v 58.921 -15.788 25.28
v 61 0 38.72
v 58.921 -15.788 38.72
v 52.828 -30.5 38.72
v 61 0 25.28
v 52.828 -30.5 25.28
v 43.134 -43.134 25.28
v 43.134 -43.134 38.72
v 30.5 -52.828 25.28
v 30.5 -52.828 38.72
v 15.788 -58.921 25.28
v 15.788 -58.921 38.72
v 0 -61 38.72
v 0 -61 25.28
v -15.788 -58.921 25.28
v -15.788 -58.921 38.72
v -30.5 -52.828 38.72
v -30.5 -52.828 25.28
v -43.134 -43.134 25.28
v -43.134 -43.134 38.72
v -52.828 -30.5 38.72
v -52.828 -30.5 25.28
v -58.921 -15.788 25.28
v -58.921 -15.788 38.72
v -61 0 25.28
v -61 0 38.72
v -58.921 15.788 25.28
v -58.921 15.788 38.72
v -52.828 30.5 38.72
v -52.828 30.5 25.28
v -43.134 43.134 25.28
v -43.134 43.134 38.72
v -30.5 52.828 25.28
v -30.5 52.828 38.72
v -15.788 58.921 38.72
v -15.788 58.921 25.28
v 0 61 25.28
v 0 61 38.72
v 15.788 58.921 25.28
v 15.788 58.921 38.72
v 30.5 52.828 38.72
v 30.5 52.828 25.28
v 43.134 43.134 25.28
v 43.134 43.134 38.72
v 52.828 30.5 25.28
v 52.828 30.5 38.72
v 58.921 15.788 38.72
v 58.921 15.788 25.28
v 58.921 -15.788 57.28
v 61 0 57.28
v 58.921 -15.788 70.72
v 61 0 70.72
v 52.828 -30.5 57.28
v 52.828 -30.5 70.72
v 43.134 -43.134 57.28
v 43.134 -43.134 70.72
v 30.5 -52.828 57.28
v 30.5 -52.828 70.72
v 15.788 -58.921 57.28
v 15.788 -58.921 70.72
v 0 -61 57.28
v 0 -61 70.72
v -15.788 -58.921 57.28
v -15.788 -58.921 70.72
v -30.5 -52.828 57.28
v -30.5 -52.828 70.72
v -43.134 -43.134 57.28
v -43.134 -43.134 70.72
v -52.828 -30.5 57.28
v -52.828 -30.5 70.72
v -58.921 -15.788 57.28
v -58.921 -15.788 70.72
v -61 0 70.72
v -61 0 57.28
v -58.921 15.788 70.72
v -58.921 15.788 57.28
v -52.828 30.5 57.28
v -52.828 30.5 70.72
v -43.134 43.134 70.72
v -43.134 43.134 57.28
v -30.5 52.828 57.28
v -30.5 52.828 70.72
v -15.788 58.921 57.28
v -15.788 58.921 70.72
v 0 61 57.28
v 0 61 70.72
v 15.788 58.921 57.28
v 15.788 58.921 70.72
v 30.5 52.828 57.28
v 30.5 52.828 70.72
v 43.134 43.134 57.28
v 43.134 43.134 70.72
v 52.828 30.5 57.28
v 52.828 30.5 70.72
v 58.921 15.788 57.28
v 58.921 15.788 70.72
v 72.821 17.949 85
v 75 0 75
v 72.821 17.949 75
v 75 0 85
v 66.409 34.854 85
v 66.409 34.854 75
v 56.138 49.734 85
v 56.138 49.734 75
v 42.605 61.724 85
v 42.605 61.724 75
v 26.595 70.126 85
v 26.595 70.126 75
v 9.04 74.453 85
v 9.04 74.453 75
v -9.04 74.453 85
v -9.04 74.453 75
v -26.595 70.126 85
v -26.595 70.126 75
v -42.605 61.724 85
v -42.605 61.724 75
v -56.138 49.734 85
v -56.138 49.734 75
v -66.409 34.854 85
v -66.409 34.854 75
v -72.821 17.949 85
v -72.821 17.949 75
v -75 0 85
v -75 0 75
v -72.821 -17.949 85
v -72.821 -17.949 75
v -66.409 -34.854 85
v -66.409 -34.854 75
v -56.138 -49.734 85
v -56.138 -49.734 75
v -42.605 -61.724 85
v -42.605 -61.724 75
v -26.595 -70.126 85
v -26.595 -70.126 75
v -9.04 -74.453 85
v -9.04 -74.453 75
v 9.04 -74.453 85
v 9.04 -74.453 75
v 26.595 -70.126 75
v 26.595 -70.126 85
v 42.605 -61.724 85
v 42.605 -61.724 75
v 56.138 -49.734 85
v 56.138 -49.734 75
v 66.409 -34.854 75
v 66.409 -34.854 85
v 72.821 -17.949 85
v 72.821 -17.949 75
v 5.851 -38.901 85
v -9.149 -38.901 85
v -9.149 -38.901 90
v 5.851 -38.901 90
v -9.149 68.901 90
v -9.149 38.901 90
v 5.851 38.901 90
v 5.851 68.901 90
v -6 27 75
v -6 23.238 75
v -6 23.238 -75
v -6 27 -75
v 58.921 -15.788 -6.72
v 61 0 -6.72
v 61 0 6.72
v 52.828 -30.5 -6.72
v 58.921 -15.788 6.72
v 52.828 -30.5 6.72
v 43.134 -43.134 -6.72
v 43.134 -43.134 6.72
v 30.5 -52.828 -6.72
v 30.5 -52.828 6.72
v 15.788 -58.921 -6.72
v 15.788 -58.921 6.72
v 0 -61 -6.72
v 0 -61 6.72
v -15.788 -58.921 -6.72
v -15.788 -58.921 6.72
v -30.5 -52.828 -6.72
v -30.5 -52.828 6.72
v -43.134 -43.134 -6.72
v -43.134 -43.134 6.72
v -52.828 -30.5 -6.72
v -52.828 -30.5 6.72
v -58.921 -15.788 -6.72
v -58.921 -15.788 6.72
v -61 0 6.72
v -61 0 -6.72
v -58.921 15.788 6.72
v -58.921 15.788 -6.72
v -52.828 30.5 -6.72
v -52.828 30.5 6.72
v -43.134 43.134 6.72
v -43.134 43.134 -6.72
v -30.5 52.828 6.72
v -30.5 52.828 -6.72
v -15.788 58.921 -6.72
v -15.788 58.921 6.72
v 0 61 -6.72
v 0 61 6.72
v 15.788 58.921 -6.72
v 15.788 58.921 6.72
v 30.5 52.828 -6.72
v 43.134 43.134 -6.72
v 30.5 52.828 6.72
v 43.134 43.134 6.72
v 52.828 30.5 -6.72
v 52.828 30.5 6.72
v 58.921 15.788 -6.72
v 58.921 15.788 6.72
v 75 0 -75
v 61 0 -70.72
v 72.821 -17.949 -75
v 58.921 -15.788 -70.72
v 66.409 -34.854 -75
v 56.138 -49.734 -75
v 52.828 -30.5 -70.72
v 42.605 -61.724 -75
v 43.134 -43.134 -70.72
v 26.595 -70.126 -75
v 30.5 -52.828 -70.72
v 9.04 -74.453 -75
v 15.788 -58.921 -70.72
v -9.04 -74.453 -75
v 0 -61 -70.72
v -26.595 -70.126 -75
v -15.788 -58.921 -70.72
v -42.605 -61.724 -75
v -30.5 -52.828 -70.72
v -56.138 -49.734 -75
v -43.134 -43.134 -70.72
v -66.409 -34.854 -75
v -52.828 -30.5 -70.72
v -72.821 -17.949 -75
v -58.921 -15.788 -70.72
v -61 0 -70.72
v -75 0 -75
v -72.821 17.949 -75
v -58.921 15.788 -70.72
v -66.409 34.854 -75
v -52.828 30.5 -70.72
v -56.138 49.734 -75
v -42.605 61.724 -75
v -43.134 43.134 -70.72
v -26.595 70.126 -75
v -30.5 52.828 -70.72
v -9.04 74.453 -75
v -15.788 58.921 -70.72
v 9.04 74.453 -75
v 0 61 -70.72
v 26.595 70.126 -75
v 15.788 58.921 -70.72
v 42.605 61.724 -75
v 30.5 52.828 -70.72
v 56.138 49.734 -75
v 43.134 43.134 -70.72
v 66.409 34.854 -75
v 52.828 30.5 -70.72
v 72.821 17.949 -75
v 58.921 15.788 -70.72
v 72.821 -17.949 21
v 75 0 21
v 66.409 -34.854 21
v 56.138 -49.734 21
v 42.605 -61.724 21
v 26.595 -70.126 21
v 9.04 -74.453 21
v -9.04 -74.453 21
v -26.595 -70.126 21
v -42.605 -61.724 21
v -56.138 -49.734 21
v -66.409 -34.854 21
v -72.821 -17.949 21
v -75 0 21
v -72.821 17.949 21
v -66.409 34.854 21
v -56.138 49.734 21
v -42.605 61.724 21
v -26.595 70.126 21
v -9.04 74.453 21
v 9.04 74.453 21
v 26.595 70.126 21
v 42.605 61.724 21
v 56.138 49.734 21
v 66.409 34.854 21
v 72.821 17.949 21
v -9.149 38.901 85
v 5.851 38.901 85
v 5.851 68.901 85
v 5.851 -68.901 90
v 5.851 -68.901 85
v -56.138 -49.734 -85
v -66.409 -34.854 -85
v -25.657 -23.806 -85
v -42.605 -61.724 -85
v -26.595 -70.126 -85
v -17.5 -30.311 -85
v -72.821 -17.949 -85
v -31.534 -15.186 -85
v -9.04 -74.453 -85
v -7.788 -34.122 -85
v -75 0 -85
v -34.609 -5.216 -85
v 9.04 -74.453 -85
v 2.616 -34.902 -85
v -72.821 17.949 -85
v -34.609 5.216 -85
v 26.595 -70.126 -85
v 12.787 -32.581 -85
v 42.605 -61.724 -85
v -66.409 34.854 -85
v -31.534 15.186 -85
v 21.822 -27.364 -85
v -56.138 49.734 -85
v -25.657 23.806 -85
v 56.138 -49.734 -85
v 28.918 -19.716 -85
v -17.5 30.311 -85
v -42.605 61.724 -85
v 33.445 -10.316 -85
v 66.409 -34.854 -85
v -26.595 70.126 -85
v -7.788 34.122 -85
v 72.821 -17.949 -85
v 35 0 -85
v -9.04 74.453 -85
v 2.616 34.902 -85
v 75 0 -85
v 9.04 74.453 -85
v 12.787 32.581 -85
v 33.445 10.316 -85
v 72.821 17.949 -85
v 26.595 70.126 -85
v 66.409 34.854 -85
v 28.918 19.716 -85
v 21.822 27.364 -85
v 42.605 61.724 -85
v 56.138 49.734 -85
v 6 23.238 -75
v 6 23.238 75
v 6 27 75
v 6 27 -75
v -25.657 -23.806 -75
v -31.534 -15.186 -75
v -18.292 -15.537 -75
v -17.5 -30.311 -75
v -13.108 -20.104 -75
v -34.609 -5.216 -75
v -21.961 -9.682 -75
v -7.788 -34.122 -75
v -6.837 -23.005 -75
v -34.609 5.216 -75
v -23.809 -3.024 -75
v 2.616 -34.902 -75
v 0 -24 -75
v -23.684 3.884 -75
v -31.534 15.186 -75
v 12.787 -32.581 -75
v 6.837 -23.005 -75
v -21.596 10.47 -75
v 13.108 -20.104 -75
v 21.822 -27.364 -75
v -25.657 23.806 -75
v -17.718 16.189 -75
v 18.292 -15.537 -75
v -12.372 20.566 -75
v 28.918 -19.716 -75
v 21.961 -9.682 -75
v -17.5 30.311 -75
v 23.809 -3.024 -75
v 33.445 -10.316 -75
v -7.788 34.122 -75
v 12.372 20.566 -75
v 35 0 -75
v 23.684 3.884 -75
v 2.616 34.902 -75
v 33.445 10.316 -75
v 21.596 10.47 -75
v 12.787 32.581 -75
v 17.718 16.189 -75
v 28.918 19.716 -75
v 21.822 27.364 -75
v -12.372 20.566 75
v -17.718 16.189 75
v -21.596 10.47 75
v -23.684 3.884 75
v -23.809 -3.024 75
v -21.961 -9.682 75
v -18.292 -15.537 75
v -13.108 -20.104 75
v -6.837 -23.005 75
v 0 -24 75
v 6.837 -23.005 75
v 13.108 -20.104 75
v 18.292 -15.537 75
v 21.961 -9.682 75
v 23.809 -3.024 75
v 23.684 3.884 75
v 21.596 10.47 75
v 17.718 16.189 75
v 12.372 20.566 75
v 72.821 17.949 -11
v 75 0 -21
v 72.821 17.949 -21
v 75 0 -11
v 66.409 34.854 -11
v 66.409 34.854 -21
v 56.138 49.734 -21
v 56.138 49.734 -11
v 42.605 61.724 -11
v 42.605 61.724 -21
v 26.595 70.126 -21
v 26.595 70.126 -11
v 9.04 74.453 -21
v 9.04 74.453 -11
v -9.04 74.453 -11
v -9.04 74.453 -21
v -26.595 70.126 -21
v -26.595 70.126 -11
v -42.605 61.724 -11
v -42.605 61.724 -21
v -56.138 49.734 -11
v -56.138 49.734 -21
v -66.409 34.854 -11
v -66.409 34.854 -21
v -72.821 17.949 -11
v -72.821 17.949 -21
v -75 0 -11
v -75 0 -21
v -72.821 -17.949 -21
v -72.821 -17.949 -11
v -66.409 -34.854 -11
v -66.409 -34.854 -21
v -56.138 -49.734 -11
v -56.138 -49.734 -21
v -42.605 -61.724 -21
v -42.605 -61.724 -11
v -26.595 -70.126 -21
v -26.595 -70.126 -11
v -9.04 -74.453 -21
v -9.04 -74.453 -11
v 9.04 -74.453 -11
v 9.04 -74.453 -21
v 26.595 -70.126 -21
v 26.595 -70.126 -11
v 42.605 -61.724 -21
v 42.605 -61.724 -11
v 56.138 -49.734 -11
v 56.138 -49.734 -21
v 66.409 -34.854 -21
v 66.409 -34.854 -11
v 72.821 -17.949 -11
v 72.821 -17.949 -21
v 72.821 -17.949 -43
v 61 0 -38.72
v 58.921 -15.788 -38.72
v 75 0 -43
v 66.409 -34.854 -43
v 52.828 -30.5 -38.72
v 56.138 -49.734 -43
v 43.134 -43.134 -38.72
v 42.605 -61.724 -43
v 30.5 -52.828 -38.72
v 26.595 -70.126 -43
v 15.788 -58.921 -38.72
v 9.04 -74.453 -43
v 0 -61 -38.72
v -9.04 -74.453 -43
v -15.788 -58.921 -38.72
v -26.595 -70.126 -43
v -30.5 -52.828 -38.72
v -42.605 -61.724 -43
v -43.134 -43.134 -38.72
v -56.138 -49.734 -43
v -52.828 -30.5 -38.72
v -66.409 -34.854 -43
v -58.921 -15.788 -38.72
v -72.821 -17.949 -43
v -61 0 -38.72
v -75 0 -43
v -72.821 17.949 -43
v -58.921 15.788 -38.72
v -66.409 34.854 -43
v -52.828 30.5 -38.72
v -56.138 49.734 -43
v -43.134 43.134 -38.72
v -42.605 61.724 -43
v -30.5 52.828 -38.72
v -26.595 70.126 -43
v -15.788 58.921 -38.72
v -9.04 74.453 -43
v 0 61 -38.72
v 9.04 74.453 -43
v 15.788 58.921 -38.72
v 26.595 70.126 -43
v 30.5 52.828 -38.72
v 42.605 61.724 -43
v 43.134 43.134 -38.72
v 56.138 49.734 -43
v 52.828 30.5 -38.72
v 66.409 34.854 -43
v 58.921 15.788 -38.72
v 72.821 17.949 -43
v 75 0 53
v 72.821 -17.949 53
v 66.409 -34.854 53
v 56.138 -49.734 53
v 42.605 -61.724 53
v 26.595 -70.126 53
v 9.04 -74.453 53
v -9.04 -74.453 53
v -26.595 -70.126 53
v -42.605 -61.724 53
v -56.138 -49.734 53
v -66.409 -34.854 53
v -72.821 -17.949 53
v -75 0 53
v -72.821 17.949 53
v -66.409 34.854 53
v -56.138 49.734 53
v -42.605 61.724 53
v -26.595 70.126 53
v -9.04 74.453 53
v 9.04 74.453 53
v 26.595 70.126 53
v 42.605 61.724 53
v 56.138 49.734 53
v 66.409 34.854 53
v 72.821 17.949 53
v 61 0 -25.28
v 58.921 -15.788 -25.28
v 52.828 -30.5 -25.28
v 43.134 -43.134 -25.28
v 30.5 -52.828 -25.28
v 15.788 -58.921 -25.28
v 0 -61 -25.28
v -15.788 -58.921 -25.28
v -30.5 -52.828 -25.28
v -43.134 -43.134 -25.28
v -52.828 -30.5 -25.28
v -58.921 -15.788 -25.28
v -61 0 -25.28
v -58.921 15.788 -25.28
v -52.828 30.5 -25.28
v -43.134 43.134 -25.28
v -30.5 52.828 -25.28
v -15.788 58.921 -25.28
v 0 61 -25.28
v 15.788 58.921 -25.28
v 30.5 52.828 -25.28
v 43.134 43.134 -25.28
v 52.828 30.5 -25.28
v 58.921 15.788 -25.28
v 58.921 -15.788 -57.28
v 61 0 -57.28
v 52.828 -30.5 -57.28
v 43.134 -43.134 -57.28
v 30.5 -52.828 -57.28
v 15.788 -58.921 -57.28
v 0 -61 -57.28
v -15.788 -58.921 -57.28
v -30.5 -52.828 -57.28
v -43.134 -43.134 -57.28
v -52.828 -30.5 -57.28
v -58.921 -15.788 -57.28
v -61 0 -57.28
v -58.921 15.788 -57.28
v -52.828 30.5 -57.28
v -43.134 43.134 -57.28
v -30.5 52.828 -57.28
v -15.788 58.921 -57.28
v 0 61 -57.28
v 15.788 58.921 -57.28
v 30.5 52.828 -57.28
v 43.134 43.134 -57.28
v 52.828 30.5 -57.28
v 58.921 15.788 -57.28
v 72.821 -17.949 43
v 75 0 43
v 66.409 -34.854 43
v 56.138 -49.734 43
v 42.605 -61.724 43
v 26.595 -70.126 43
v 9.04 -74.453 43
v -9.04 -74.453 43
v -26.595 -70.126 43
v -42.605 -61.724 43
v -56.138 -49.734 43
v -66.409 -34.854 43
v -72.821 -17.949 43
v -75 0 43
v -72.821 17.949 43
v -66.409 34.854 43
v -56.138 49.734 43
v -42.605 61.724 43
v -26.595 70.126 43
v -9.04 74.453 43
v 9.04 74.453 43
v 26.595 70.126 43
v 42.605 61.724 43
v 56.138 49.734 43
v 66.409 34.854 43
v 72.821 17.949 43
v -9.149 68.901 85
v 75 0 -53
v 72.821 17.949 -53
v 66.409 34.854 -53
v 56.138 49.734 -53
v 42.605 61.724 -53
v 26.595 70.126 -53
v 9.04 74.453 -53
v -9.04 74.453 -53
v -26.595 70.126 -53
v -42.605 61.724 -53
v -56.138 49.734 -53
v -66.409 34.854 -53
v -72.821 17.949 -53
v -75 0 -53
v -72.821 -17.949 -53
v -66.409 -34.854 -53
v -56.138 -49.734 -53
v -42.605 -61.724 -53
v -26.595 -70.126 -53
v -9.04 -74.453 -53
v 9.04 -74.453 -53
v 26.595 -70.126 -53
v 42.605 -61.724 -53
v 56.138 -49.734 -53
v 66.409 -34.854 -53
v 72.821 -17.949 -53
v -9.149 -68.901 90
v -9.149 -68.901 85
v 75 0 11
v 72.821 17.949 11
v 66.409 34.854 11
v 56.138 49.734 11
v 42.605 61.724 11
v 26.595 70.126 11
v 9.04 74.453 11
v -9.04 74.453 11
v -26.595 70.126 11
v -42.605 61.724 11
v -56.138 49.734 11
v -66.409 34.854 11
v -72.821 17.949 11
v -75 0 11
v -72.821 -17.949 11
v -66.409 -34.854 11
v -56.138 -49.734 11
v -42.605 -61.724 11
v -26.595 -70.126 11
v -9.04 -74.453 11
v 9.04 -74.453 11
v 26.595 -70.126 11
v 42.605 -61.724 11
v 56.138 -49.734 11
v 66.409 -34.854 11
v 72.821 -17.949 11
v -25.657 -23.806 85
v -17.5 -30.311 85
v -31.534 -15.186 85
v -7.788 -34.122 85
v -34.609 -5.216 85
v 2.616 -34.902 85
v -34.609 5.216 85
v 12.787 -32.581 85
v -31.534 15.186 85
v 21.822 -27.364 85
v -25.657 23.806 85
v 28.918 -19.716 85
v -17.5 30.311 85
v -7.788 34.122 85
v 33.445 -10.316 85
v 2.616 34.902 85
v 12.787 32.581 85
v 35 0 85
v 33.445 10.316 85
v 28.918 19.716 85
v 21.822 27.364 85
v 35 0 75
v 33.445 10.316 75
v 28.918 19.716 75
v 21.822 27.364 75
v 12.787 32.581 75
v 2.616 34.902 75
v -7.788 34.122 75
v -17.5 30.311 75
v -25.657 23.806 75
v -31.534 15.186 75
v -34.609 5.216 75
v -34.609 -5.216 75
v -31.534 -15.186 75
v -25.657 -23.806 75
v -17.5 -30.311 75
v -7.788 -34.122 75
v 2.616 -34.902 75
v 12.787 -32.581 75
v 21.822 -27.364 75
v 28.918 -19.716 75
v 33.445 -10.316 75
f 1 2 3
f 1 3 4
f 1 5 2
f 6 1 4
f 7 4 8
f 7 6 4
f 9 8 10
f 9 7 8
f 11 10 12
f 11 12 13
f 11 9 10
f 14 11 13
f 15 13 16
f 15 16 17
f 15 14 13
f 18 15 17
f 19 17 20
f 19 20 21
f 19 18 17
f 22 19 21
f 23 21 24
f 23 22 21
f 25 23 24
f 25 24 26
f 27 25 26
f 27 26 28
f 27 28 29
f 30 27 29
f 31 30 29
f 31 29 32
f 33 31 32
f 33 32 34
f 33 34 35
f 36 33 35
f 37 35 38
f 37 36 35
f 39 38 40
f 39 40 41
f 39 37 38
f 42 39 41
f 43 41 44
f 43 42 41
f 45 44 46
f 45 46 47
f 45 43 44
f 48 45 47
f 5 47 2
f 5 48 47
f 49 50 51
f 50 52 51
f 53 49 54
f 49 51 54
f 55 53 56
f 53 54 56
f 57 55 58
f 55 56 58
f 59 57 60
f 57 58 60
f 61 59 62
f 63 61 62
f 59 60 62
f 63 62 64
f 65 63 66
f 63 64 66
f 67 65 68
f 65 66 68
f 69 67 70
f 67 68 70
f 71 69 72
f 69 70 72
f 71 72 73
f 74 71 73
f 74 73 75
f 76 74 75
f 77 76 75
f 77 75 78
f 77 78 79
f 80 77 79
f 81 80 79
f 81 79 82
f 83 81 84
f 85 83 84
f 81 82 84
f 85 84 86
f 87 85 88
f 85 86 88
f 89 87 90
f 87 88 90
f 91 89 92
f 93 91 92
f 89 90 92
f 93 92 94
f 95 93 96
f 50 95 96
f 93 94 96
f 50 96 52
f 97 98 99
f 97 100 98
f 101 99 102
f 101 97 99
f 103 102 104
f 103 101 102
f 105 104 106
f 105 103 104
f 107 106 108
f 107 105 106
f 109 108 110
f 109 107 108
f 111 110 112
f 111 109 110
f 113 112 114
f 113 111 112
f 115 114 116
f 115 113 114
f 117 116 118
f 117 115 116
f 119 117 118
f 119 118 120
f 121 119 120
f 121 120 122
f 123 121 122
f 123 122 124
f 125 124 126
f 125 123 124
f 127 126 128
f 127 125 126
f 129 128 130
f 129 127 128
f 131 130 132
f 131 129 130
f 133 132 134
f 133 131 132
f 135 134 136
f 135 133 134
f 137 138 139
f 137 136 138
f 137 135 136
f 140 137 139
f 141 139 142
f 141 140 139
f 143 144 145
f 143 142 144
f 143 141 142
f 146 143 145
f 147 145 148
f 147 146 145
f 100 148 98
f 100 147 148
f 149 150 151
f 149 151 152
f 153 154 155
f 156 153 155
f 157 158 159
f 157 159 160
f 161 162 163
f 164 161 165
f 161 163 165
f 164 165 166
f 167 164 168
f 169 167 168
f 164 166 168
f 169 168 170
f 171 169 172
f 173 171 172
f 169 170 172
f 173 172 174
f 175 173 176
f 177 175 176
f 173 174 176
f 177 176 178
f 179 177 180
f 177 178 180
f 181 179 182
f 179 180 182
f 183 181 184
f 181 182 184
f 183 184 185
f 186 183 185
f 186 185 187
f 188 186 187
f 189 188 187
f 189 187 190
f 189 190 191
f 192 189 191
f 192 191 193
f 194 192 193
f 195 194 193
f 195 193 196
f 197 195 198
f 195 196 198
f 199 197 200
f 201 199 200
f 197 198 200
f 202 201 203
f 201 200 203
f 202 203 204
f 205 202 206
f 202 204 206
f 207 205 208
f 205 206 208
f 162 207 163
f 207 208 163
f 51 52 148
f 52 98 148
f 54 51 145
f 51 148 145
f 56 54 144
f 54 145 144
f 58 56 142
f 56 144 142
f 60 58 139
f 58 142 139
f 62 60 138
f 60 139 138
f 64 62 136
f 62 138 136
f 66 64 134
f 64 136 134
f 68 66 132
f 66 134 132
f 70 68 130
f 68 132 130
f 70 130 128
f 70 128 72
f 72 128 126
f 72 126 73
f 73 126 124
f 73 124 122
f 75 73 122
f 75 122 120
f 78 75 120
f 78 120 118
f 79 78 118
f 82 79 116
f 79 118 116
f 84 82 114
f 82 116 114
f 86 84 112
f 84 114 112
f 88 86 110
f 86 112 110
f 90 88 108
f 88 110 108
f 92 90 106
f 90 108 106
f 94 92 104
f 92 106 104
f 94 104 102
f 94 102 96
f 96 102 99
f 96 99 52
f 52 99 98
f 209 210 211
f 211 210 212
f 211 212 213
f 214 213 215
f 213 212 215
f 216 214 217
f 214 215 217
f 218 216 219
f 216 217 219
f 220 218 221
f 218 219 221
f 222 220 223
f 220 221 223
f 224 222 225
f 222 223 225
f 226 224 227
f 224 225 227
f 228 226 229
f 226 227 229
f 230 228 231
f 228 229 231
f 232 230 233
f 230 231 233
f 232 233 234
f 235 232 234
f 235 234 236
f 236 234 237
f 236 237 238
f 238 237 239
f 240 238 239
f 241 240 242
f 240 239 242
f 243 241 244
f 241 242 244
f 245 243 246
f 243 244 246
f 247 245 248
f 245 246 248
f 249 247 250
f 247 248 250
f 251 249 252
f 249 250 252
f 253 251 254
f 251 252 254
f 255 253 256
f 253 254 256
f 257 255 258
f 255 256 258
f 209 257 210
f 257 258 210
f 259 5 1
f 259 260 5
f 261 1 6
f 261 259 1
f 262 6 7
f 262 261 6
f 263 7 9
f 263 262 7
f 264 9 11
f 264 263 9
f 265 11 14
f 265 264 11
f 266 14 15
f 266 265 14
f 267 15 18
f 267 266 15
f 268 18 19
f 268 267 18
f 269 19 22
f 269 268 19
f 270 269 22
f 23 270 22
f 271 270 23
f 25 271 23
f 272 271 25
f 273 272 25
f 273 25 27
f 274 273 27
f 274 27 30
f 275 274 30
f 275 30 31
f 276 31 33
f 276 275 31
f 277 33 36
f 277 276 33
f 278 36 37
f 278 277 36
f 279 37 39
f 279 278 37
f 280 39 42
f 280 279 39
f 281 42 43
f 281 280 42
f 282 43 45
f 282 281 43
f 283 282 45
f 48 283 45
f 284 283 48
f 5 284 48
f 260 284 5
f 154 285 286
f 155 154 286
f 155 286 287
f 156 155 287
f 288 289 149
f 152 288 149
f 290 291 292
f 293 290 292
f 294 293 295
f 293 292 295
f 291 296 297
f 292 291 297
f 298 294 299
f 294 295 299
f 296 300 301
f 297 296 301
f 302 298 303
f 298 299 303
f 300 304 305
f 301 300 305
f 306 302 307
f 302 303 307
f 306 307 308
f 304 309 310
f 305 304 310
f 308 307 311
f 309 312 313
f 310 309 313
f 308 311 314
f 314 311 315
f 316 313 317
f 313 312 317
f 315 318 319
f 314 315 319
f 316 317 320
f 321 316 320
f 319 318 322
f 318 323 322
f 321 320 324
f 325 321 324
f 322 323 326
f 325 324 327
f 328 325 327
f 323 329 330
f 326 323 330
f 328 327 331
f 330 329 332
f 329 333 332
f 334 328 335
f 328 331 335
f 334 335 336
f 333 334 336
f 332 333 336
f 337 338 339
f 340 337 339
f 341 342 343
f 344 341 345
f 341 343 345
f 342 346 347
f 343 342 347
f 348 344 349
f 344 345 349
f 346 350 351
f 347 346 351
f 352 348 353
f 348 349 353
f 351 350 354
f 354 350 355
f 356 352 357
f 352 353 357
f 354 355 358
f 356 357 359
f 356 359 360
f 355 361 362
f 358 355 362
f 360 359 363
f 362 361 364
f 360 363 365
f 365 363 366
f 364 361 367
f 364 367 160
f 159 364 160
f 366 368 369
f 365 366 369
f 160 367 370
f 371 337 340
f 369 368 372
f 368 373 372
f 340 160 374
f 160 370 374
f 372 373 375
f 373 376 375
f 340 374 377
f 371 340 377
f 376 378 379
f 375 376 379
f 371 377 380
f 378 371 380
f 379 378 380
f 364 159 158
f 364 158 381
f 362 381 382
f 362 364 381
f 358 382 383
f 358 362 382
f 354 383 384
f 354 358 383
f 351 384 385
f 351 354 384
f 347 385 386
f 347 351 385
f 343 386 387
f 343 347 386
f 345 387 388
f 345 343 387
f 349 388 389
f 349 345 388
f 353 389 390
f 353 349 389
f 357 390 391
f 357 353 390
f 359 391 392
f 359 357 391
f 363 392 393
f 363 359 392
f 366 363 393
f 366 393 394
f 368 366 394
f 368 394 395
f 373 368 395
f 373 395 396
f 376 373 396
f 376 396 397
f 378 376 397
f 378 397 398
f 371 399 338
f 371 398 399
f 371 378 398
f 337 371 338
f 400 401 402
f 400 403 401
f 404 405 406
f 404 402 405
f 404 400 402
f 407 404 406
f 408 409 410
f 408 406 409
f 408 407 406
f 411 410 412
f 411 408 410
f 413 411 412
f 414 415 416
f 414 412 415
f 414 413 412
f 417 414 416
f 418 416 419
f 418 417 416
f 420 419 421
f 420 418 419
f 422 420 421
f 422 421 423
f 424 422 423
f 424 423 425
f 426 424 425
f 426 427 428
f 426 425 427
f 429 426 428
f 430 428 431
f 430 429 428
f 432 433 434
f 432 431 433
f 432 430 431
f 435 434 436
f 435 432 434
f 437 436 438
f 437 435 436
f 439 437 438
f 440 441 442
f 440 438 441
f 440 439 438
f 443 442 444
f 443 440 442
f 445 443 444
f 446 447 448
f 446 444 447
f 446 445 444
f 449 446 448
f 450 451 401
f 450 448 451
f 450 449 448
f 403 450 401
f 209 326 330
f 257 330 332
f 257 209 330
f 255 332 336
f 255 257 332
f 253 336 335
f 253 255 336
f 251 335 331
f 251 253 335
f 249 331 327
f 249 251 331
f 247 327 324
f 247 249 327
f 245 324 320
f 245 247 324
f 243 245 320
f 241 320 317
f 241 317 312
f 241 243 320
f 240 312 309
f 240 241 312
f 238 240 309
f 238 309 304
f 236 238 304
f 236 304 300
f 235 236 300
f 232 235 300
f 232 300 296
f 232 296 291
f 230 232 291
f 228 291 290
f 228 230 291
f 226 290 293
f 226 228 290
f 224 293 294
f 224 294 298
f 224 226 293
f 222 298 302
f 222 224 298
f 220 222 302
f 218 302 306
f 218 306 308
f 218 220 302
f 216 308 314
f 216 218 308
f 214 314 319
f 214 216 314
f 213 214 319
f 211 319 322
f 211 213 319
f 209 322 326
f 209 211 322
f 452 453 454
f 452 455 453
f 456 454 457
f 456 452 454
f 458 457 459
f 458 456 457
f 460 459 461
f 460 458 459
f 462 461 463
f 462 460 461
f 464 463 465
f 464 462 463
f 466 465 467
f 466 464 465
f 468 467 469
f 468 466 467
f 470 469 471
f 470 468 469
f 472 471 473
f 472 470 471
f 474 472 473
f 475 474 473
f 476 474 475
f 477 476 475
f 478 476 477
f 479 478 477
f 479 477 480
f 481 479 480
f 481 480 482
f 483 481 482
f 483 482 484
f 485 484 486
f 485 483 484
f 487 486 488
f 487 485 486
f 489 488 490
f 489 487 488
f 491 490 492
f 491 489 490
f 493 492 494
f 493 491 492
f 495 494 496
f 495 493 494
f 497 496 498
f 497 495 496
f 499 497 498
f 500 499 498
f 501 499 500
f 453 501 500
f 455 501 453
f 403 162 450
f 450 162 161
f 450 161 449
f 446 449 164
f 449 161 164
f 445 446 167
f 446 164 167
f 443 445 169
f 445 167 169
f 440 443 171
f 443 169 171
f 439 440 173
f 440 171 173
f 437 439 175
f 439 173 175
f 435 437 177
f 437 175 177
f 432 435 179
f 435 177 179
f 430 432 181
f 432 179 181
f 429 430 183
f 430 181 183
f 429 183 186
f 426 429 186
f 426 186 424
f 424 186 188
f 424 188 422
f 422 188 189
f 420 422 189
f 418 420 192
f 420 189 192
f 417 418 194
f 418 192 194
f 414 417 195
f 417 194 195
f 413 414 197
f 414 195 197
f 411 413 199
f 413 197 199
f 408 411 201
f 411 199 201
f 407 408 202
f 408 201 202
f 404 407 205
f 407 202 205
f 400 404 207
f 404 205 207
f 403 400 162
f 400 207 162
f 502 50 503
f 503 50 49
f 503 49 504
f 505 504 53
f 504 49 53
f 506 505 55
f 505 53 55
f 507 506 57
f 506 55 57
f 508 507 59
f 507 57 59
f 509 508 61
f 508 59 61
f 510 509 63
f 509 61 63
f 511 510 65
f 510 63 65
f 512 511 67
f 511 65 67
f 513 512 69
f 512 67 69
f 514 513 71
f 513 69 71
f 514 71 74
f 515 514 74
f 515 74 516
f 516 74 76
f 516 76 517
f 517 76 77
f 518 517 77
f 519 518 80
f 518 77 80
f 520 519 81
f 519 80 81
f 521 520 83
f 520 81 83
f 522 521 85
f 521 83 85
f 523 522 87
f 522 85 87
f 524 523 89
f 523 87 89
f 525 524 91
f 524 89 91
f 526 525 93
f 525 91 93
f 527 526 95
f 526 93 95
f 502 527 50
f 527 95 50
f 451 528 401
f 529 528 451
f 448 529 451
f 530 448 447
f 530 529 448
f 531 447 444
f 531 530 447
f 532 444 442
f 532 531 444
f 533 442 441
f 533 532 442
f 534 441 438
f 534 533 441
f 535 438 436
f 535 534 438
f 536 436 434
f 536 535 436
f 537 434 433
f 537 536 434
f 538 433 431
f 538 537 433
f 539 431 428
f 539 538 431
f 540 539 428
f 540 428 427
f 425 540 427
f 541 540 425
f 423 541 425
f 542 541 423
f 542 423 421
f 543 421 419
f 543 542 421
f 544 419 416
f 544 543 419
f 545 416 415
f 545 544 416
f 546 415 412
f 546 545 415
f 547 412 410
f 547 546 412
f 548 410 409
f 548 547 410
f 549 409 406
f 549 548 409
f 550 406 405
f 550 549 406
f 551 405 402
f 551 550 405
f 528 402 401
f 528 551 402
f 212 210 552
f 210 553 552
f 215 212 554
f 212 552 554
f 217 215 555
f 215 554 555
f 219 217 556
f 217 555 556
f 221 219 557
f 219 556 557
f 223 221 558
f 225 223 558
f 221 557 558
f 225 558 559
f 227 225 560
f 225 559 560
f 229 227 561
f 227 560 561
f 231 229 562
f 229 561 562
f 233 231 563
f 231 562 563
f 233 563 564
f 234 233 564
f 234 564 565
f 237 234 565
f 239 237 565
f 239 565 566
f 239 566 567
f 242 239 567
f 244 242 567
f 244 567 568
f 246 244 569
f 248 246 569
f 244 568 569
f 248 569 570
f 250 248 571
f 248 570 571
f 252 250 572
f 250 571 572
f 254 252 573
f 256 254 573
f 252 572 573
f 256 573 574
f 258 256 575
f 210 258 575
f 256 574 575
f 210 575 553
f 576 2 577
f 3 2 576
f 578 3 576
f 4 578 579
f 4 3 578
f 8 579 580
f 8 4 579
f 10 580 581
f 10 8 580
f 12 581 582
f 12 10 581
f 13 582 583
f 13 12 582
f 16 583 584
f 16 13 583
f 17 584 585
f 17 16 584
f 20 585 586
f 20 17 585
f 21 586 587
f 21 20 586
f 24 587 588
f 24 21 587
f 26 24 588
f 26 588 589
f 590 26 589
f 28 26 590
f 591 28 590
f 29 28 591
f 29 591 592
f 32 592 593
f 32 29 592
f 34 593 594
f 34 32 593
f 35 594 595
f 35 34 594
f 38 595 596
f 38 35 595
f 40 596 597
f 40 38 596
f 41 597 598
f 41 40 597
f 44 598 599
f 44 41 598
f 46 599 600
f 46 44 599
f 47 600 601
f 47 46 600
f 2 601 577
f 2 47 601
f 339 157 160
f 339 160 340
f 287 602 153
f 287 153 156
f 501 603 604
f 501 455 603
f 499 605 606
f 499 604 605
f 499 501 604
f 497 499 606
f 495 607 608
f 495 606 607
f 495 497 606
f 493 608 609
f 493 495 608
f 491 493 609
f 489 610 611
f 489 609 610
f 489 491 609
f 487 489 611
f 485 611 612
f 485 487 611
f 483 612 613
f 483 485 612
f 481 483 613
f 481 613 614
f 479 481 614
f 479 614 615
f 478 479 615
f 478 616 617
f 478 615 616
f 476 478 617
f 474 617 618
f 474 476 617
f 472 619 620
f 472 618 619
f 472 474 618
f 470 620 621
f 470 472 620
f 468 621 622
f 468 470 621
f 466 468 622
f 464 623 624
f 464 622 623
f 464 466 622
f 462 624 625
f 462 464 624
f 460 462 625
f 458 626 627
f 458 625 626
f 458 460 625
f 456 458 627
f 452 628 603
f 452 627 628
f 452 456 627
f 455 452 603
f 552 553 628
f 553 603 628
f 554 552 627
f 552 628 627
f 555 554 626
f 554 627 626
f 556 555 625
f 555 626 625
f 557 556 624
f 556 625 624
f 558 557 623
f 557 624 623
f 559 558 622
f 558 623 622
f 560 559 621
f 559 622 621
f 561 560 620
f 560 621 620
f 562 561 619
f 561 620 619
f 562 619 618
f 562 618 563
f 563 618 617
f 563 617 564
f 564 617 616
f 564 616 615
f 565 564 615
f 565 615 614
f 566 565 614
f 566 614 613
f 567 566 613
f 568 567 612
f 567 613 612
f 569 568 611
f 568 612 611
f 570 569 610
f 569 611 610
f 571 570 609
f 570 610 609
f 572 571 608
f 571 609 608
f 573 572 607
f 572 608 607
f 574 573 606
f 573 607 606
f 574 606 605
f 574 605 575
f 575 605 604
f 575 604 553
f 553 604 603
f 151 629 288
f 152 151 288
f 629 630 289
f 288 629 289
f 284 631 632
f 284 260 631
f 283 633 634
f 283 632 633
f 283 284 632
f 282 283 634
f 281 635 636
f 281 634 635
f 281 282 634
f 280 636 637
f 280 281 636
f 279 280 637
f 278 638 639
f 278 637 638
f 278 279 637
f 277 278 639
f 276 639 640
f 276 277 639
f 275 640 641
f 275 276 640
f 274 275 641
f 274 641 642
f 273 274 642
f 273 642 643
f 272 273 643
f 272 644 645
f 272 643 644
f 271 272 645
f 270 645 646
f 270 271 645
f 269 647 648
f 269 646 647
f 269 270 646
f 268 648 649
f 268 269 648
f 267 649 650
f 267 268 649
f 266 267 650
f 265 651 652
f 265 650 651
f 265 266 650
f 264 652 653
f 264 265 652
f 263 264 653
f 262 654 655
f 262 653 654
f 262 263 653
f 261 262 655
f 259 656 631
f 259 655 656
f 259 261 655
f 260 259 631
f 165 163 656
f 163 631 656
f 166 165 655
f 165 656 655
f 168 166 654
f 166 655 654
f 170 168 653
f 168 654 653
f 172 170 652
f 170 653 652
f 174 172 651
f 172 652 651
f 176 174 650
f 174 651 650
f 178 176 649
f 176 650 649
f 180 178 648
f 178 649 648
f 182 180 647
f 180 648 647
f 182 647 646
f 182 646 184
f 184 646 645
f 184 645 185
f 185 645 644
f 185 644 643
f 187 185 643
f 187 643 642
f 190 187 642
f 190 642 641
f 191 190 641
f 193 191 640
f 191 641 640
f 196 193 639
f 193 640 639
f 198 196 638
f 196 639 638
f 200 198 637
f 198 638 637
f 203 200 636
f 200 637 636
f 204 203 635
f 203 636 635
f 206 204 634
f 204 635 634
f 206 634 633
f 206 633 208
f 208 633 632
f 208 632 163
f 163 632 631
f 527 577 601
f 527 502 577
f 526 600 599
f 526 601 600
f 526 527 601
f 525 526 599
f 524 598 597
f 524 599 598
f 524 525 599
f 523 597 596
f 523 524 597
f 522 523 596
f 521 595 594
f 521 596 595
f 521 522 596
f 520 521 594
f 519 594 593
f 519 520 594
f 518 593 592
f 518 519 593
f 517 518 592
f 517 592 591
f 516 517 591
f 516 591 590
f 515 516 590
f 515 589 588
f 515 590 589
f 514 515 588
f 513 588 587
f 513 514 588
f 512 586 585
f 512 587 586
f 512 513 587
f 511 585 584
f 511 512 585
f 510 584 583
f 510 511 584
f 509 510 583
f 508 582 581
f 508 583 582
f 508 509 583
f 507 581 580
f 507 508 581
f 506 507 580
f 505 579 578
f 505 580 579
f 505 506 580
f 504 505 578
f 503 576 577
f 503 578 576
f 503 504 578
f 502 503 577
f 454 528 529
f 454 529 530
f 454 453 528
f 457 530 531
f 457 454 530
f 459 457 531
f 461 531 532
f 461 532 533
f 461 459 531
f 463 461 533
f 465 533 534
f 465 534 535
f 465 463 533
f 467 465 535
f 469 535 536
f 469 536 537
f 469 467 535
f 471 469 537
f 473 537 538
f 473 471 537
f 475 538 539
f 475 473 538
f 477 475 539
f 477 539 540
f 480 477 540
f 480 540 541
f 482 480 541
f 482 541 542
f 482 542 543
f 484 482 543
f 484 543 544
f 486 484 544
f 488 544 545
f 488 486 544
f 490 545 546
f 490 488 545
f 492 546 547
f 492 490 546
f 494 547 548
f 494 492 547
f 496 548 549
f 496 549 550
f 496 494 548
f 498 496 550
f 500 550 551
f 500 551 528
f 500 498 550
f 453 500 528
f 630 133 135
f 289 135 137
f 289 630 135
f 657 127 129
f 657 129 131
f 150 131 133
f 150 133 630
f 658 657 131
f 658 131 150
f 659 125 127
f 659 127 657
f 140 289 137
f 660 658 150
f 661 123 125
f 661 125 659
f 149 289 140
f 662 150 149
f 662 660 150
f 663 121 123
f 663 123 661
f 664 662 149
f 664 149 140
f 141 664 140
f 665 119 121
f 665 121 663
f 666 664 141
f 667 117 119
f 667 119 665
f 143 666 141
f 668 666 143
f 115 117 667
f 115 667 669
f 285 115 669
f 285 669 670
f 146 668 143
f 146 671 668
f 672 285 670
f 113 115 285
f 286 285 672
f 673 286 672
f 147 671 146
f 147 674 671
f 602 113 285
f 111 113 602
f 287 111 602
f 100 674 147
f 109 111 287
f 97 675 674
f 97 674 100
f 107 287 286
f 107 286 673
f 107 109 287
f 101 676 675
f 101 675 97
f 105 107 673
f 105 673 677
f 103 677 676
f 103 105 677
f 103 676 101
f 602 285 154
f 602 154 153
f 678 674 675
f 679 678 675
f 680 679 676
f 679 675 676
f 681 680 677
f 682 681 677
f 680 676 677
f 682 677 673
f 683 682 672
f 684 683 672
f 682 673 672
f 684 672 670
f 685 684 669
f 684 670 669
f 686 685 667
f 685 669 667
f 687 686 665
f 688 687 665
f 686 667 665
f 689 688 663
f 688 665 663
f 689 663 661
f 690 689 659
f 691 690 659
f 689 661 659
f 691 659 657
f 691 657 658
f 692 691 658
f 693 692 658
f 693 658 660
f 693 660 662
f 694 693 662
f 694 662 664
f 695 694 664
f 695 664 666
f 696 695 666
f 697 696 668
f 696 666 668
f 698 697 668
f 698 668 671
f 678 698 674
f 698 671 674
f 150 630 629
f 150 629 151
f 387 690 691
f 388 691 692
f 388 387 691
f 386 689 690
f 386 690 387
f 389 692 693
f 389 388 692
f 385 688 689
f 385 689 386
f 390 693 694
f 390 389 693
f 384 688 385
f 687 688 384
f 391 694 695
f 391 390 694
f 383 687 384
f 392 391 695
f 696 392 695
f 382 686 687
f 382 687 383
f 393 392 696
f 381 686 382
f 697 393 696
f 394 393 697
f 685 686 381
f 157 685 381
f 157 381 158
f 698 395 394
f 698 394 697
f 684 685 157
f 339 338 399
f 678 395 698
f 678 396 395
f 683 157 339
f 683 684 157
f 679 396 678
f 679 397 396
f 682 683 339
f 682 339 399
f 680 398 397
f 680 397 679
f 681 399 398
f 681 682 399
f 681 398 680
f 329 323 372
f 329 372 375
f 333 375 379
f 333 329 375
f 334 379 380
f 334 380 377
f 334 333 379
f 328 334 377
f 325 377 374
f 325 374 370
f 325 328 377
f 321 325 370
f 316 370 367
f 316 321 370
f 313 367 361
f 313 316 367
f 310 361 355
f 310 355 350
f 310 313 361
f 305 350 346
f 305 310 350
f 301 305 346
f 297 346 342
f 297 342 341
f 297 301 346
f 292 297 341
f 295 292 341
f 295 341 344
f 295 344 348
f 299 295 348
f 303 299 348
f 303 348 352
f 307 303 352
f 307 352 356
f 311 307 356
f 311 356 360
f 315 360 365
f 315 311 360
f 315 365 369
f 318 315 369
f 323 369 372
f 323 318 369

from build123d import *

# Parameters (mm, degrees)
SKETCH1_R           = 75
SKETCH1_R_2         = 24
BOSS_EXTRUDE1_DEPTH = 85
SKETCH3_W           = 12
SKETCH3_H           = 6
CUT_EXTRUDE1_DEPTH  = 201.374649095
SKETCH4_R           = 35
SKETCH4_R_2         = 20
CUT_EXTRUDE2_DEPTH  = 10
SKETCH5_W           = 15
SKETCH5_H           = 30
BOSS_EXTRUDE2_DEPTH = 5


with BuildPart() as part:
    # Sketch1 → Boss-Extrude1 (new, symmetric)
    with BuildSketch(Plane.XY):
        Circle(SKETCH1_R)
        Circle(SKETCH1_R_2, mode=Mode.SUBTRACT)
    extrude(amount=BOSS_EXTRUDE1_DEPTH, both=True)

    # Sketch2 → Cut-Revolve1 (revolve, cut)
    with BuildSketch(Plane(origin=(0, 0, 0), x_dir=(1, 0, 0), z_dir=(0, 1, 0))):
        Polygon((75, 75), (61, 70.71977046), (61, 57.28022954), (75, 53), align=None)
        Polygon((75, 43), (75, 21), (61, 25.28022954), (61, 38.71977046), align=None)
        Polygon((75, -21), (75, -43), (61, -38.71977046), (61, -25.28022954), align=None)
        Polygon((75, 11), (61, 6.71977046), (61, -6.71977046), (75, -11), align=None)
        Polygon((75, -75), (75, -53), (61, -57.28022954), (61, -70.71977046), align=None)
    revolve(axis=Axis((0, 0, 0), (0, 0, -1)), mode=Mode.SUBTRACT)

    # Sketch3 → Cut-Extrude1 (cut, through all)
    with BuildSketch(Plane.XY.offset(85)):
        with Locations((0, 24)):
            Rectangle(SKETCH3_W, SKETCH3_H)
    extrude(amount=-CUT_EXTRUDE1_DEPTH, mode=Mode.SUBTRACT)

    # Sketch4 → Cut-Extrude2 (cut)
    with BuildSketch(Plane.XY.offset(85)):
        Circle(SKETCH4_R)
        Circle(SKETCH4_R_2, mode=Mode.SUBTRACT)
    cut_extrude2 = extrude(amount=-CUT_EXTRUDE2_DEPTH, mode=Mode.SUBTRACT)

    # Mirror1: Cut-Extrude2 across plane
    add(cut_extrude2.mirror(Plane.XY), mode=Mode.SUBTRACT)

    # Sketch5 → Boss-Extrude2 (add)
    with BuildSketch(Plane.XY.offset(85)):
        with Locations((-1.649481041, 53.900577931)):
            Rectangle(SKETCH5_W, SKETCH5_H)
        with Locations((-1.649481041, -53.900577931)):
            Rectangle(SKETCH5_W, SKETCH5_H)
    extrude(amount=BOSS_EXTRUDE2_DEPTH)


solid = part.part
